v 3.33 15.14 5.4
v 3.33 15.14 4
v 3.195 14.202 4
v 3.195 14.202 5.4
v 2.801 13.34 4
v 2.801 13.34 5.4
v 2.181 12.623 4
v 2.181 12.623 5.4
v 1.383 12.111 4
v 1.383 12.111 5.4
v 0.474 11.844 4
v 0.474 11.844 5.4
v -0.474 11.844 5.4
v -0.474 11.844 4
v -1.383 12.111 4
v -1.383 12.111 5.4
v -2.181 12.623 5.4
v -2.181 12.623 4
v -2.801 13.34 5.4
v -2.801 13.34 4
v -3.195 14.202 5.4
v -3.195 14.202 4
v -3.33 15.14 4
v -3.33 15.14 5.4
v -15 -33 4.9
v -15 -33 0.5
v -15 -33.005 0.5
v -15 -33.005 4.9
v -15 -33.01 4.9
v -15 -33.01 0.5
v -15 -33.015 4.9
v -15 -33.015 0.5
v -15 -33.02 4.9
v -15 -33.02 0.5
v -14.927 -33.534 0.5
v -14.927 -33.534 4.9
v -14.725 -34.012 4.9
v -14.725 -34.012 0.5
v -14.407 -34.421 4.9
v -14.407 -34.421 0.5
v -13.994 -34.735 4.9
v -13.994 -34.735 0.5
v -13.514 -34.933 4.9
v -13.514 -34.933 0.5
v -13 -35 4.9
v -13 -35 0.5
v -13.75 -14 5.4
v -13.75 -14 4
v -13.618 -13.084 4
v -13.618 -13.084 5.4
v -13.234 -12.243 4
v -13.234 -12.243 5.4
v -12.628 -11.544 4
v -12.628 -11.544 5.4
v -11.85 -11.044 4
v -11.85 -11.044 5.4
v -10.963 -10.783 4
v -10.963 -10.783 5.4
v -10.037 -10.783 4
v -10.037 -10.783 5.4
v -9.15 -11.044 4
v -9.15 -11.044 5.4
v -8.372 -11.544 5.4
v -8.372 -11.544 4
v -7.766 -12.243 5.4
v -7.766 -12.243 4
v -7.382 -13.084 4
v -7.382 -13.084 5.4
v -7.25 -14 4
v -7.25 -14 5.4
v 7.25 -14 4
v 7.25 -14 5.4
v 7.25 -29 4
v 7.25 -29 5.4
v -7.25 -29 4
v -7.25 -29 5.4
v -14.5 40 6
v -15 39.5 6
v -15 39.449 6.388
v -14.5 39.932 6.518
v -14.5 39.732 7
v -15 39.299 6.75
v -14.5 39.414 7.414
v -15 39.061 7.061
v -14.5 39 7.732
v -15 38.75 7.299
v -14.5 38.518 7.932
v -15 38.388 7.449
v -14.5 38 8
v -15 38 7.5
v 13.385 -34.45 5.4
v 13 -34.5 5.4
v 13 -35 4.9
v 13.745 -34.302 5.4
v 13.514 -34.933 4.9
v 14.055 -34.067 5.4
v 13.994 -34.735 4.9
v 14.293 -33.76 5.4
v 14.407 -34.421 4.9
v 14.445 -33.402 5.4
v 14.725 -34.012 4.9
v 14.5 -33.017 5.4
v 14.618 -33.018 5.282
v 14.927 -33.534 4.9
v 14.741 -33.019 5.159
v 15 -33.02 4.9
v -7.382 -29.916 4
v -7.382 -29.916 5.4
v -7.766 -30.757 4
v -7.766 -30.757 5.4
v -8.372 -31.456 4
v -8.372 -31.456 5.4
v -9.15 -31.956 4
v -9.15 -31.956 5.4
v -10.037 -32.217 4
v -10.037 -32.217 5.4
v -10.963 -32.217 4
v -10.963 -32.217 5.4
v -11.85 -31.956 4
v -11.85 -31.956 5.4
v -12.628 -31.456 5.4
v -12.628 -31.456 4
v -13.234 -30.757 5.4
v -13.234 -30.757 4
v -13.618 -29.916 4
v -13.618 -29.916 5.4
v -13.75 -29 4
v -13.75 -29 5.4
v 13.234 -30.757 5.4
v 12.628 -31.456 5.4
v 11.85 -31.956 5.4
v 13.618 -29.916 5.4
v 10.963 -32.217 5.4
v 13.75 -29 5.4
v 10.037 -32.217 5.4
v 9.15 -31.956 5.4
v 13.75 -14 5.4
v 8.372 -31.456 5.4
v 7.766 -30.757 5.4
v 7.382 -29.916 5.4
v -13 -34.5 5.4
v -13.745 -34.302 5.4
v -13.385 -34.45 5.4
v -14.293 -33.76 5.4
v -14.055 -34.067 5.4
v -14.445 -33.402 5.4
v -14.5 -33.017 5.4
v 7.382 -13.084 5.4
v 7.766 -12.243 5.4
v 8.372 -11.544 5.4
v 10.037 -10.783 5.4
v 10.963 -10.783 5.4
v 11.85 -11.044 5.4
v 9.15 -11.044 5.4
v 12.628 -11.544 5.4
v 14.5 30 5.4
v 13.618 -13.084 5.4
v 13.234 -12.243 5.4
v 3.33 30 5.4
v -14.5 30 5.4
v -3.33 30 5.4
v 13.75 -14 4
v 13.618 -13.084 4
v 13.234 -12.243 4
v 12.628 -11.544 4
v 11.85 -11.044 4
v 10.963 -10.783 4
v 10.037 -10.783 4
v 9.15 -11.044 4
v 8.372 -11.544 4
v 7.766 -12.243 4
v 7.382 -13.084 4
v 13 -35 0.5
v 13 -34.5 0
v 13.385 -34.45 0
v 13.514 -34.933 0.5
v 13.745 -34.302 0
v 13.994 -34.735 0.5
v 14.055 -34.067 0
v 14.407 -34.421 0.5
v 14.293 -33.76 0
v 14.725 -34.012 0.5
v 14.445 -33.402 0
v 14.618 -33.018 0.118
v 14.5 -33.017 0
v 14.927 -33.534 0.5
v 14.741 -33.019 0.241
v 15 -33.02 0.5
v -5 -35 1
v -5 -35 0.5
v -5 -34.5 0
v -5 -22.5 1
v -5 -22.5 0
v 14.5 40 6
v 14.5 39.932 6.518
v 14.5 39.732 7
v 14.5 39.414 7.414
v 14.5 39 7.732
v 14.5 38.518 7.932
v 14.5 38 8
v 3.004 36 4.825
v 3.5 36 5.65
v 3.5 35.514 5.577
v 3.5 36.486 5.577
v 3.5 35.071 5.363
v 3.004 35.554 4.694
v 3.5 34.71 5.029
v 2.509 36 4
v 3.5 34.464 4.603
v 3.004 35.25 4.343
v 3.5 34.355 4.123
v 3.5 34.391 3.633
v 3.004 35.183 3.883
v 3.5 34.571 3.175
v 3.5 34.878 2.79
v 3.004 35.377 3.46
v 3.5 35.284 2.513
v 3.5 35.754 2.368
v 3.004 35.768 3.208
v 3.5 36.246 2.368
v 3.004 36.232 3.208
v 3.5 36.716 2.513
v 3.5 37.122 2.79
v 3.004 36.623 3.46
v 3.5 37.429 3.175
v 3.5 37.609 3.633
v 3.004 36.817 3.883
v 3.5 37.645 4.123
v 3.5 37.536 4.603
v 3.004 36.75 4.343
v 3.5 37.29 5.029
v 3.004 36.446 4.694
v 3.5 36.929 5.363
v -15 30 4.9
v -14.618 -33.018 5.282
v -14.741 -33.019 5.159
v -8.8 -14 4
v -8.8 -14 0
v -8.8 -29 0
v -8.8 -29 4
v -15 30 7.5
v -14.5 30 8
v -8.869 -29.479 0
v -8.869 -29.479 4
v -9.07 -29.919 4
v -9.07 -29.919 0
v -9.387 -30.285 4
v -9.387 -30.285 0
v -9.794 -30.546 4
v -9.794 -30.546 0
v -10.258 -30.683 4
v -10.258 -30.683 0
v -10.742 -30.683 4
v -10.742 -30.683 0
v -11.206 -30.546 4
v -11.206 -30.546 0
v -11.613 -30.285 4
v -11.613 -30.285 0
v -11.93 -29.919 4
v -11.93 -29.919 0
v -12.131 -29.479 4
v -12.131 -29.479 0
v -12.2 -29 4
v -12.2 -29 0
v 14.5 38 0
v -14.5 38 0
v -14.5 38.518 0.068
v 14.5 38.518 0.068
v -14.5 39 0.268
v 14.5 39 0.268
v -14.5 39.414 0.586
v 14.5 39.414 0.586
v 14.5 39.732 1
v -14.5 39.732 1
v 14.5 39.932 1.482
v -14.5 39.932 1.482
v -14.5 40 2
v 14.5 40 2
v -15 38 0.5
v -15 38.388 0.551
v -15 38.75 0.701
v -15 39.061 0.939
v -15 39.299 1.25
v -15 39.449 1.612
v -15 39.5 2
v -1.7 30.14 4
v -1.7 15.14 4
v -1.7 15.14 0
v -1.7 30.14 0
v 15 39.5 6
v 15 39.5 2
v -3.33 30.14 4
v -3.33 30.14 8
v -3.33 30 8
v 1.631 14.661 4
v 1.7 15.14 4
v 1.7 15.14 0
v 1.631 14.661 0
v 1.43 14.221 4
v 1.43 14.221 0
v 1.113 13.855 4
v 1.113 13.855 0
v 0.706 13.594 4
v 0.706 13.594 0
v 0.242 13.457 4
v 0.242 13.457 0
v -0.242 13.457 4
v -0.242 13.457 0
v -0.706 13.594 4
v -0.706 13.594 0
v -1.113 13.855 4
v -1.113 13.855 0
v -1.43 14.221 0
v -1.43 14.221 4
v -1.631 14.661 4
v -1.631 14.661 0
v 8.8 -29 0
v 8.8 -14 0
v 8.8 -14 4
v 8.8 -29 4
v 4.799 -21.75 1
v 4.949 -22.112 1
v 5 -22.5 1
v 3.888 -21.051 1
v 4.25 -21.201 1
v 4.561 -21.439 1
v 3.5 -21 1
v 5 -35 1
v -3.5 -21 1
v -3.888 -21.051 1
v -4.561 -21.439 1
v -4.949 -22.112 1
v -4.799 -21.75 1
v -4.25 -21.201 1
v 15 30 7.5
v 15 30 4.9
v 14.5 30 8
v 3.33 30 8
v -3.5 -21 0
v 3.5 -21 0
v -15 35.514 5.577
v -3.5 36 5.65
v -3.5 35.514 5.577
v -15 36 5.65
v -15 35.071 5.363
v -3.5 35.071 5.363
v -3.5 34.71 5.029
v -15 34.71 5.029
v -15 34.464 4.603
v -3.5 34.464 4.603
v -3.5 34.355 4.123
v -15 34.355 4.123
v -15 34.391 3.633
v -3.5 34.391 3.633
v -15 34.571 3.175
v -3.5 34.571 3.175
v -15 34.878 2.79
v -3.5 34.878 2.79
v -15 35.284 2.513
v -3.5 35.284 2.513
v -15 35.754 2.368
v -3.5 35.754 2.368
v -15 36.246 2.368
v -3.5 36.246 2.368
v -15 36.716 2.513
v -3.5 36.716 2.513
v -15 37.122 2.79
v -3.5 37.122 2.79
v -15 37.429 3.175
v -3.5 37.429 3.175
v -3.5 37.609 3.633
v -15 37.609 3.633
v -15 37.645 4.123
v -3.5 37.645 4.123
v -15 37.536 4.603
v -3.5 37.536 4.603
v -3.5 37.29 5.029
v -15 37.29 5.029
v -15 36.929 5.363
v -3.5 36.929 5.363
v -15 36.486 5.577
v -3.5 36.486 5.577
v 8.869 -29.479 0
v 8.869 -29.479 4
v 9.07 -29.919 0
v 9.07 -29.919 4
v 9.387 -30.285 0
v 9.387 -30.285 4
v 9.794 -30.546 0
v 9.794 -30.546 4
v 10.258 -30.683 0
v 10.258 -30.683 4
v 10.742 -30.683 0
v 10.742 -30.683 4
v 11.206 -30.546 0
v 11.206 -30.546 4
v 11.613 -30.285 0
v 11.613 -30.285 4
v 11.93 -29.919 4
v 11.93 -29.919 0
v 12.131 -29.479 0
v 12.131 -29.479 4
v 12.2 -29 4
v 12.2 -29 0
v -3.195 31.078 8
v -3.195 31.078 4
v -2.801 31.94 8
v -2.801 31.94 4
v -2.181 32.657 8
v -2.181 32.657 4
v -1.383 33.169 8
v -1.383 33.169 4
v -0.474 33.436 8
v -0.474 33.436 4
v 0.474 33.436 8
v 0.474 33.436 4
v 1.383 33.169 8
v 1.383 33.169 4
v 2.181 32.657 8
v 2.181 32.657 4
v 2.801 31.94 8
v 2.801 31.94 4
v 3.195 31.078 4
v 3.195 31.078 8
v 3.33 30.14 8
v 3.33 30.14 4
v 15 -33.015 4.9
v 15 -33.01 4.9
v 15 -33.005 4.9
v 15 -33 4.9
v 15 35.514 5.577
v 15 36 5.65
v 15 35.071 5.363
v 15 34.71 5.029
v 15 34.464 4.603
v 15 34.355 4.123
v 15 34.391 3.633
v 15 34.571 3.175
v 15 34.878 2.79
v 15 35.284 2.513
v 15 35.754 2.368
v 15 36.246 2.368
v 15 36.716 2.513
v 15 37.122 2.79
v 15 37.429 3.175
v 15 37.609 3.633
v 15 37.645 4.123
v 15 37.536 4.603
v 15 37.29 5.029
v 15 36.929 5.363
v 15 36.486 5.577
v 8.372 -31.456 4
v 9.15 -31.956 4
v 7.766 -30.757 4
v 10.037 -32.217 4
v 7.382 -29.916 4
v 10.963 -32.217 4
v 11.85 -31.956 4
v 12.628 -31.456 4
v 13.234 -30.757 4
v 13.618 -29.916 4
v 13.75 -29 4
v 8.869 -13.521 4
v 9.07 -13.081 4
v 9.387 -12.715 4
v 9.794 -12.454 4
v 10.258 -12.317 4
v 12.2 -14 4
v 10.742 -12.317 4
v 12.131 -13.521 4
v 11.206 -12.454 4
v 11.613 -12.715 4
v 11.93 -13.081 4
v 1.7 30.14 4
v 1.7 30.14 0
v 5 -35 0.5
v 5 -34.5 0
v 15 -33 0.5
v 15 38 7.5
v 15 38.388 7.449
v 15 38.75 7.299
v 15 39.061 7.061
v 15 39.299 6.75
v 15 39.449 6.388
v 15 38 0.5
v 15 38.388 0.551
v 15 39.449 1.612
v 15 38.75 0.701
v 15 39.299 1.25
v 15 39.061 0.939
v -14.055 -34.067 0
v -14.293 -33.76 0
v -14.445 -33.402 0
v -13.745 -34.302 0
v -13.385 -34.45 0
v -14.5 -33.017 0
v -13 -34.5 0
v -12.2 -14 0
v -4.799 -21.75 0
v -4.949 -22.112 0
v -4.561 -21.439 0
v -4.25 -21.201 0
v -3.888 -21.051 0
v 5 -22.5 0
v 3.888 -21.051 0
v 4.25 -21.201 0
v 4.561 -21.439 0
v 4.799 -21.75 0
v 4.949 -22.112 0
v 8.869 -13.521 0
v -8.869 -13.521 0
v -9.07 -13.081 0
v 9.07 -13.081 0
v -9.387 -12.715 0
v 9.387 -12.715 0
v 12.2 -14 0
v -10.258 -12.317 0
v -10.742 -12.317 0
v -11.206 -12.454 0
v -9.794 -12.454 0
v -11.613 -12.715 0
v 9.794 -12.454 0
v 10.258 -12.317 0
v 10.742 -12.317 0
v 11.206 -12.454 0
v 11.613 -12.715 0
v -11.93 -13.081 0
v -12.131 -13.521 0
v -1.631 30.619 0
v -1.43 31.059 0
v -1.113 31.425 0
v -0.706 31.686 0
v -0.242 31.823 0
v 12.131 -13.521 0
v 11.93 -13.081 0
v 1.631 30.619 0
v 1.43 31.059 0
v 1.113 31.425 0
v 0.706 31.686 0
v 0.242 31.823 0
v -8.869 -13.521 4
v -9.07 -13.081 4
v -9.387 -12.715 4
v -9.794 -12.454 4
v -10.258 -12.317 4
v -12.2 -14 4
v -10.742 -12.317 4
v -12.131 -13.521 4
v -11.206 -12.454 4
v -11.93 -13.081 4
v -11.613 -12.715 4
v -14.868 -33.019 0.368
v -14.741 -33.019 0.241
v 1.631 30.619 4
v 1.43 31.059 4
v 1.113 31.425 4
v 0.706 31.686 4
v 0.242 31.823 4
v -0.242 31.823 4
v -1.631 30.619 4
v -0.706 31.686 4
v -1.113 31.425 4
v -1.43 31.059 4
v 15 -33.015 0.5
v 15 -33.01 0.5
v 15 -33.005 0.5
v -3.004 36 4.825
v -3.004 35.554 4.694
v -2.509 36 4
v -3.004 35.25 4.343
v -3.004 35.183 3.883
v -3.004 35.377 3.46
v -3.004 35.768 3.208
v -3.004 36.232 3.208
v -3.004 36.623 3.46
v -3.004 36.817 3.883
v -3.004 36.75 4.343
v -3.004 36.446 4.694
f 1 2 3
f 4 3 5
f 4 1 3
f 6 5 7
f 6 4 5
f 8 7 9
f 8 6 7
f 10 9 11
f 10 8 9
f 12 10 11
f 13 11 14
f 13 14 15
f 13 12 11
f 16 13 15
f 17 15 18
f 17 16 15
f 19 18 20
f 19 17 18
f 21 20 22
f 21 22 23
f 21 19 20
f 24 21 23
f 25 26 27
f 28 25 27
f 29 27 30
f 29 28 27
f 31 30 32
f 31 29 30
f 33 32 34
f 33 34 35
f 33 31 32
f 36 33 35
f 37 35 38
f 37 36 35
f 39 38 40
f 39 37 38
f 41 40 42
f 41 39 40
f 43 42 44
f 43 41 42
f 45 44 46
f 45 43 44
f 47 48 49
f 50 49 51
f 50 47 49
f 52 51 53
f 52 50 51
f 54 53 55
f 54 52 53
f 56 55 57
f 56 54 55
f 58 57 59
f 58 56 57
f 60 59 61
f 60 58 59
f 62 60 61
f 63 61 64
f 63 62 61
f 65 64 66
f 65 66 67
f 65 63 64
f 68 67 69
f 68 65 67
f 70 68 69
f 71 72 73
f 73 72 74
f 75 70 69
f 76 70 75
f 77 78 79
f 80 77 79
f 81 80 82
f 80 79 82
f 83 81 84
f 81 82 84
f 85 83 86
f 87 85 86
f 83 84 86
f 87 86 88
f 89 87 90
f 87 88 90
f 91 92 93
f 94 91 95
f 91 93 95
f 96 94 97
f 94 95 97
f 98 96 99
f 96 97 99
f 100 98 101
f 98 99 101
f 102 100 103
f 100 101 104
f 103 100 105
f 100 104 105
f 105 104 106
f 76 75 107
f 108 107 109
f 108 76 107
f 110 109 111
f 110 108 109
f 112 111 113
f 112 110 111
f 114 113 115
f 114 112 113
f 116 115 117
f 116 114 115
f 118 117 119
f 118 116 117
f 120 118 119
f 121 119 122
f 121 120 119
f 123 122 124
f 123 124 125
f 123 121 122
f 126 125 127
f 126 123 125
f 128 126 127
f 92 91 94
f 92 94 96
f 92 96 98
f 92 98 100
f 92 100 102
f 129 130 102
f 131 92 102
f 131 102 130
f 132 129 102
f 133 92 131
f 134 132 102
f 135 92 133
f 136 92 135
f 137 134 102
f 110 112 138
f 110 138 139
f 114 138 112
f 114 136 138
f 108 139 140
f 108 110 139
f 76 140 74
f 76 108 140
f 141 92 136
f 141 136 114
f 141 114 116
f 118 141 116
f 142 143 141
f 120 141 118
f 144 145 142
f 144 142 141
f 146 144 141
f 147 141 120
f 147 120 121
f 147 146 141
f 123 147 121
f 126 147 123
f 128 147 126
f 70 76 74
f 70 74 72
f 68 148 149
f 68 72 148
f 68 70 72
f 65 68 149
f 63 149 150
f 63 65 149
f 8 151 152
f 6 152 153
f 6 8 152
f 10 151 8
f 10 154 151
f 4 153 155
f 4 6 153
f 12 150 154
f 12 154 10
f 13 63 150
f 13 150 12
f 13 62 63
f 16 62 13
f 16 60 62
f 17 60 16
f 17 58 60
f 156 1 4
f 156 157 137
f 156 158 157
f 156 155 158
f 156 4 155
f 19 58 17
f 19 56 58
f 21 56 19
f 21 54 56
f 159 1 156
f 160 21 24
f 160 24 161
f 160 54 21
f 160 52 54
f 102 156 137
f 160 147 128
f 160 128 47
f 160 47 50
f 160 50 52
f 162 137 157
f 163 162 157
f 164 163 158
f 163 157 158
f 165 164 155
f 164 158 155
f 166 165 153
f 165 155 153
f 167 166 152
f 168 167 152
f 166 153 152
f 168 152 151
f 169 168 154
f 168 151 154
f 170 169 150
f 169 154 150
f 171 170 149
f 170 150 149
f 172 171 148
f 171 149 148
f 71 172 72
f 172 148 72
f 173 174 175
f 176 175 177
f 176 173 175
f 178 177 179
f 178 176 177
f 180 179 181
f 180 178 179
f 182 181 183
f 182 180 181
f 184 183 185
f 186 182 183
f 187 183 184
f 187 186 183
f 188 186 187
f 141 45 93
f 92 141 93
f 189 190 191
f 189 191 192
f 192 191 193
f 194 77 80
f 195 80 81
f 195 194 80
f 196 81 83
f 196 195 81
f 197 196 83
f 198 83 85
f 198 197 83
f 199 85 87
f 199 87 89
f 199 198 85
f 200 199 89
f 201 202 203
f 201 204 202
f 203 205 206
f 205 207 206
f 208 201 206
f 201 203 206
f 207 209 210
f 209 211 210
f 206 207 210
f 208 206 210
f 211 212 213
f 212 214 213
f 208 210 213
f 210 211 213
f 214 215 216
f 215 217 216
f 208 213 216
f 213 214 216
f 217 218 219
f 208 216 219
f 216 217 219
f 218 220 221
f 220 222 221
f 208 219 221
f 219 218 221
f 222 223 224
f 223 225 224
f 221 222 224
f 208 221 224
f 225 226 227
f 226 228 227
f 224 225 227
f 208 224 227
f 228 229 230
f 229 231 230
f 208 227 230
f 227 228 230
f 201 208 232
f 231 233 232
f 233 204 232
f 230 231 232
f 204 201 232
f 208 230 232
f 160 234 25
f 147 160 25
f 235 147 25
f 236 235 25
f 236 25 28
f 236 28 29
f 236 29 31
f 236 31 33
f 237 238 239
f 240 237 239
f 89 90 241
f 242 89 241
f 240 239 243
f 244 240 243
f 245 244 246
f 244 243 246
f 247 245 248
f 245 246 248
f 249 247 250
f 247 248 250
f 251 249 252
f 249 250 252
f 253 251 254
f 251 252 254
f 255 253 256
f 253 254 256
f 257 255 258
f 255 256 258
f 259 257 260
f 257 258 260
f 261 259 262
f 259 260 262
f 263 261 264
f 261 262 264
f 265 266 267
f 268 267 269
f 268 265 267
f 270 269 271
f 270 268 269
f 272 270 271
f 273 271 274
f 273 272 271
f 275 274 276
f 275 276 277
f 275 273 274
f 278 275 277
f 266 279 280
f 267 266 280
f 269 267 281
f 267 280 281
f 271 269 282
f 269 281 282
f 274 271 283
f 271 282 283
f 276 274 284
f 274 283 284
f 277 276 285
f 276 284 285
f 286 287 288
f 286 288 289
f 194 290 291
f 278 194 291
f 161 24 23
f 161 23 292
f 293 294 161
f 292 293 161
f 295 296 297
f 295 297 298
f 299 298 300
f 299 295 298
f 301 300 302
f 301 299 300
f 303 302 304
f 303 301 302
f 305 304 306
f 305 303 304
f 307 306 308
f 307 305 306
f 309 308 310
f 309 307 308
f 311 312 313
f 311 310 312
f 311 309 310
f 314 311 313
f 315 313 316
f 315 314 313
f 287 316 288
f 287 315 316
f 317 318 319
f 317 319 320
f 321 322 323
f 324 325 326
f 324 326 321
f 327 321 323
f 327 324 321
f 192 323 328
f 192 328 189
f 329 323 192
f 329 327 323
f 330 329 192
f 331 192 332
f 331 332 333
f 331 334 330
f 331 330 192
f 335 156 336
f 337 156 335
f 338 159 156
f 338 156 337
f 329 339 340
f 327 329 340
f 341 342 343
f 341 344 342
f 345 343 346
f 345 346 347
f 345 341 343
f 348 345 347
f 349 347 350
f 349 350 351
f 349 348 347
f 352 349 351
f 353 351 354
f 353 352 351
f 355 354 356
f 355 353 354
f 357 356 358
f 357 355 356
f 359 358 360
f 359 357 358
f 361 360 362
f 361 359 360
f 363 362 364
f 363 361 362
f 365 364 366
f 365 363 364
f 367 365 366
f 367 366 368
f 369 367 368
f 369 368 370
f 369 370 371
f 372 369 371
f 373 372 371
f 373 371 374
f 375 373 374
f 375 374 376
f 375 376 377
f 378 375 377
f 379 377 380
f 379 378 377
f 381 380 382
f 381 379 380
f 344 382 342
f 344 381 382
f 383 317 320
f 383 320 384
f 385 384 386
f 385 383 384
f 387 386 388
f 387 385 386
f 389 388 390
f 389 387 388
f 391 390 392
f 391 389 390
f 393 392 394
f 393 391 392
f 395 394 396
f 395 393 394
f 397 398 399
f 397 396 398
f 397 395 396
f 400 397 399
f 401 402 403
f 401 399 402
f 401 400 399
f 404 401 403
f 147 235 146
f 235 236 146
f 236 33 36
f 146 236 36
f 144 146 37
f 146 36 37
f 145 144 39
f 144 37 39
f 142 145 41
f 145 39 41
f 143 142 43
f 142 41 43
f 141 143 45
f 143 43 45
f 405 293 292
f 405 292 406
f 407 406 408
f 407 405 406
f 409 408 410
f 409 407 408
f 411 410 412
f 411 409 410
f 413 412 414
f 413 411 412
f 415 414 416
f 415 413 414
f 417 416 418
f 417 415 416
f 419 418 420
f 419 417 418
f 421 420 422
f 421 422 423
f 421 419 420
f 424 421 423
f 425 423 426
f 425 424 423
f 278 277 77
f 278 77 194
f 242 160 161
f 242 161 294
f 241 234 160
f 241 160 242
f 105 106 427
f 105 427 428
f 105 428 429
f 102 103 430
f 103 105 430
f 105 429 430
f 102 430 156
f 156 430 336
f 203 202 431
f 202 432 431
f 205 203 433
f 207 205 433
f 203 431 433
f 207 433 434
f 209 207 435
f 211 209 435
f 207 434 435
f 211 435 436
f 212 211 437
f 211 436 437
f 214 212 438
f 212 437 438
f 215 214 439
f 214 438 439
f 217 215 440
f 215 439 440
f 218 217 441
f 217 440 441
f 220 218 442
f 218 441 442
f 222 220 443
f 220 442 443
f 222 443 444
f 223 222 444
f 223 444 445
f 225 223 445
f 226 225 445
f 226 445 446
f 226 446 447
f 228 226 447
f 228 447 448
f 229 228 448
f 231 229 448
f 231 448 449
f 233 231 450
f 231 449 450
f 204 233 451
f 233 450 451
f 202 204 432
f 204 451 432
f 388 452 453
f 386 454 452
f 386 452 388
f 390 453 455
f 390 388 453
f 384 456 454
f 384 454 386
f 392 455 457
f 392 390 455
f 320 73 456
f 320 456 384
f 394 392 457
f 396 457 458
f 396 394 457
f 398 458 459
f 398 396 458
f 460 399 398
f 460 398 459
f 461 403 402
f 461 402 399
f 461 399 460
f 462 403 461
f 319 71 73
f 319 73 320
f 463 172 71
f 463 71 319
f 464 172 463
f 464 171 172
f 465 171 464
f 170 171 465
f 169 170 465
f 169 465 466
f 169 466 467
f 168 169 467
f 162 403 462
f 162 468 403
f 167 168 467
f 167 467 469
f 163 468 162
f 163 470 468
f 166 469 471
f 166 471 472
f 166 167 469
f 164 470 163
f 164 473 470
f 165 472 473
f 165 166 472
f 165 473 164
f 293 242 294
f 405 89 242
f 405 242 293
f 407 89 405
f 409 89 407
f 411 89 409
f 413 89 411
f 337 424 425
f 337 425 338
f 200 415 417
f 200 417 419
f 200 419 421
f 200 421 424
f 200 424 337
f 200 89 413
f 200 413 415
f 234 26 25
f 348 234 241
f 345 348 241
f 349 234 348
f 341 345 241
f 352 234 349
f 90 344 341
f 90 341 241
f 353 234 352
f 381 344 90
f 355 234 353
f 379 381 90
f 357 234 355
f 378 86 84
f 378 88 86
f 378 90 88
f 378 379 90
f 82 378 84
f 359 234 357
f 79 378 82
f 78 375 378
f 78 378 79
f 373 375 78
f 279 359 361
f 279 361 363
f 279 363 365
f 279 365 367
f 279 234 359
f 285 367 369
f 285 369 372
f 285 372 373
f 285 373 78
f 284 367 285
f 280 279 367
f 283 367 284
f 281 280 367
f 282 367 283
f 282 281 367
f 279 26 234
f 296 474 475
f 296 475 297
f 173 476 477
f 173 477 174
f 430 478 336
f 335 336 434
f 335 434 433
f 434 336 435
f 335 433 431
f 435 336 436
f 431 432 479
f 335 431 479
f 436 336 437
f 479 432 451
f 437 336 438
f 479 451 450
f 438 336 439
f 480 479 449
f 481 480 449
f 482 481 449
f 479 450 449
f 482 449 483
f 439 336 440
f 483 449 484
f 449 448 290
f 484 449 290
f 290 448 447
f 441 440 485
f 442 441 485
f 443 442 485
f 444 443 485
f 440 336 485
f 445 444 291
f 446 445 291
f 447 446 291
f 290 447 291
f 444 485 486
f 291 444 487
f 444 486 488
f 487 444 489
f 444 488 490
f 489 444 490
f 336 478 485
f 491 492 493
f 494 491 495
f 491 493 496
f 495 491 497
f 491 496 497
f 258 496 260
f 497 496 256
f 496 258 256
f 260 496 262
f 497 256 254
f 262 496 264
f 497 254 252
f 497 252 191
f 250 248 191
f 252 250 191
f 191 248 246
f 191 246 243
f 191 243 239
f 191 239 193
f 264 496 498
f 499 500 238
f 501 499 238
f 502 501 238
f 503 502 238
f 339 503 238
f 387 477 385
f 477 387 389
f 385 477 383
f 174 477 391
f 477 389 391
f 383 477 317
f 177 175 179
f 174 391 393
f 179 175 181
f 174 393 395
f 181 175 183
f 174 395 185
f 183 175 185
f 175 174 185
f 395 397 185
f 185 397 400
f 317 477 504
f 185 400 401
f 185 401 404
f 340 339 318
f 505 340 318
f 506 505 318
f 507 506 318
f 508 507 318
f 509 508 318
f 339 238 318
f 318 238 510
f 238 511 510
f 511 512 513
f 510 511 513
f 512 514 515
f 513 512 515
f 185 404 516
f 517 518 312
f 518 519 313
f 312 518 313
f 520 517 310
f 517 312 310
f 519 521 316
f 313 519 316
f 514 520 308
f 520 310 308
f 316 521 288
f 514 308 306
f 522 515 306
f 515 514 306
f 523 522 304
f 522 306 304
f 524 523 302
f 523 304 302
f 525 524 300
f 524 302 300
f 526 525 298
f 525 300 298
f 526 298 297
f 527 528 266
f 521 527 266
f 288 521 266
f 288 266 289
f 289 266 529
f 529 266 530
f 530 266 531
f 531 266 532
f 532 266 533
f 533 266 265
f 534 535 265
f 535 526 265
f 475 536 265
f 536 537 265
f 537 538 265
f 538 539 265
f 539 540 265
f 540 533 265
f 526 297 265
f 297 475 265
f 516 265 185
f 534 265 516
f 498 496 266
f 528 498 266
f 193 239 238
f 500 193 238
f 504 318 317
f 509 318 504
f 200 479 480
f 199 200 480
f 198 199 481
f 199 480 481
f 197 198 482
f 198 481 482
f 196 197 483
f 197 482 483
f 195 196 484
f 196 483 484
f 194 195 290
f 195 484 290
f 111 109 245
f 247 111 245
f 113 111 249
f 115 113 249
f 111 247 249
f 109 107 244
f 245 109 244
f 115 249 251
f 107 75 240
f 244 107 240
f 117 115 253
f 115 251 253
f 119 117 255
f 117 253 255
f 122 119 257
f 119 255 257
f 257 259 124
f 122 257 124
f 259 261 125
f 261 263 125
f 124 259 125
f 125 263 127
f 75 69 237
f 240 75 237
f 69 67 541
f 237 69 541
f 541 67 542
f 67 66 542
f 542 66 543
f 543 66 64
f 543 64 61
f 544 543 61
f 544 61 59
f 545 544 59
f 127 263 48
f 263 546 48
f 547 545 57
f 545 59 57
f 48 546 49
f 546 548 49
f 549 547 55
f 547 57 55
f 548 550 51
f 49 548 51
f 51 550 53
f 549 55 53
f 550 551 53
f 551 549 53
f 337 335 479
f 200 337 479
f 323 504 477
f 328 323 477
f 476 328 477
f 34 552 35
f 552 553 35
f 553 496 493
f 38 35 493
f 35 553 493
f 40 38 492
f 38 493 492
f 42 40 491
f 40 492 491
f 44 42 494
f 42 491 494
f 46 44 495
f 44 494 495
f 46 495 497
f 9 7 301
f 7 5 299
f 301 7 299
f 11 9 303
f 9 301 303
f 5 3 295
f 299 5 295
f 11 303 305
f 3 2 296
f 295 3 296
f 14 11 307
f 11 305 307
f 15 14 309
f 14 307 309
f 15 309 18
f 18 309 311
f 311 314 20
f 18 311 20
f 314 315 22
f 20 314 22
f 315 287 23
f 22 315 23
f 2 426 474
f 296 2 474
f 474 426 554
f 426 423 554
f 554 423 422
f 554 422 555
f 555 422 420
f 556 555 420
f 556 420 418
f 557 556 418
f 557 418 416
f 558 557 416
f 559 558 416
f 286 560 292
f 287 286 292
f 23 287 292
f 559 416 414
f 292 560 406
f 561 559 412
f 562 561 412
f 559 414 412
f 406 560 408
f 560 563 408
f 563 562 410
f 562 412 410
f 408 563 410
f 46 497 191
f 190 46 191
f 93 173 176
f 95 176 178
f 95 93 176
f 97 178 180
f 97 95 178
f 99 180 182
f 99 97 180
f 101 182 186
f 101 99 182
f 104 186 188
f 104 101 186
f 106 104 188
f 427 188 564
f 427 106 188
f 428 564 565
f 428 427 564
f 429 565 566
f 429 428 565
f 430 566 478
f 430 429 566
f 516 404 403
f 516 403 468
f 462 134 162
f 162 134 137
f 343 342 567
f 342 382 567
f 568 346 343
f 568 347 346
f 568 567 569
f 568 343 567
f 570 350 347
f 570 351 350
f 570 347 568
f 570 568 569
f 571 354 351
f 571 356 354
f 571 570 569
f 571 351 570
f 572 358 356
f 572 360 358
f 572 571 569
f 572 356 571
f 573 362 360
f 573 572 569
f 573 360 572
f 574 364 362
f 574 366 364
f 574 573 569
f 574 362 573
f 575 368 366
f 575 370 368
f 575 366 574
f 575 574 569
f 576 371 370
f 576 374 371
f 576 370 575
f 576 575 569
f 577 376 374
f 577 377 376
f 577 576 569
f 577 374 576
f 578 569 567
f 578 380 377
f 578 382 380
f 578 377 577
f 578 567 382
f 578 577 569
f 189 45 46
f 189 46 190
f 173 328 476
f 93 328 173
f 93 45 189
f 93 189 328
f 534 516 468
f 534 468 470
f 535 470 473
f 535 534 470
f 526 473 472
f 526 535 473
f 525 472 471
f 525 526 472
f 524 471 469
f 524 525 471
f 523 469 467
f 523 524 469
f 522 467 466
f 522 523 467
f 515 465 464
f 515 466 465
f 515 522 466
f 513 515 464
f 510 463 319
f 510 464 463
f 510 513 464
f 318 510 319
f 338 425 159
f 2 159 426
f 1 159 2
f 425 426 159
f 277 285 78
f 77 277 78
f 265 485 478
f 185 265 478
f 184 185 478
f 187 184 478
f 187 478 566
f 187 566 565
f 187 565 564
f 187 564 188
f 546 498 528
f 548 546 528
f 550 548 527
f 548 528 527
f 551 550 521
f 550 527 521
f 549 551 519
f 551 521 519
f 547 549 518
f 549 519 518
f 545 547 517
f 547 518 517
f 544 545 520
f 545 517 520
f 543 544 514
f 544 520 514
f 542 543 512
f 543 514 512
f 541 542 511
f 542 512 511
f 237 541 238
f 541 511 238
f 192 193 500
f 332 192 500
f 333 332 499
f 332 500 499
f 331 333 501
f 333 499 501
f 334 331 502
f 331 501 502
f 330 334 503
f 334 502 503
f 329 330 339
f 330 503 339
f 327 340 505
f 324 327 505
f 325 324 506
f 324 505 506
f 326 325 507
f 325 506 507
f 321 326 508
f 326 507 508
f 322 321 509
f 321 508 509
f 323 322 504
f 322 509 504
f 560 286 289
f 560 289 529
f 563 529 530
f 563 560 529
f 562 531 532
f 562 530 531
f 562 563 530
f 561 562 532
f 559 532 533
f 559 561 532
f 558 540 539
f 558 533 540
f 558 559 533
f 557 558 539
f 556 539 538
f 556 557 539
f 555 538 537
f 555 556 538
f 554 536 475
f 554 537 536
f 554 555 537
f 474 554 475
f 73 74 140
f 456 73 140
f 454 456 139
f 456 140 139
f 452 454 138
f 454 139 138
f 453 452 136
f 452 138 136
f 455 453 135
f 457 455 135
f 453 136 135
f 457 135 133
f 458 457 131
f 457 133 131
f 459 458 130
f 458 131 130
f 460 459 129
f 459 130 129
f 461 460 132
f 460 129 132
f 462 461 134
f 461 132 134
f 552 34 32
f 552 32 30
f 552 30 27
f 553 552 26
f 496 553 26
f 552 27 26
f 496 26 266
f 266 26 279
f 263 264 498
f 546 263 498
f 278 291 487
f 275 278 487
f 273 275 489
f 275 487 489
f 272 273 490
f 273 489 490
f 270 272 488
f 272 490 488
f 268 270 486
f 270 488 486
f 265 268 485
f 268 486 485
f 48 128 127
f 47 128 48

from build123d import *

# Parameters (mm, degrees)
SKETCH1_W           = 30
SKETCH1_H           = 80
BOSS_EXTRUDE1_DEPTH = 8
CUT_EXTRUDE1_DEPTH  = 44.462627624
CUT_EXTRUDE2_DEPTH  = 4
CUT_EXTRUDE3_DEPTH  = 32
CUT_EXTRUDE4_DEPTH  = 4
SKETCH8_W           = 2.6
SKETCH8_H           = 70
CUT_EXTRUDE5_DEPTH  = 73
FILLET1_R           = 2
FILLET2_R           = 2
CHAMFER1_SIZE       = 0.5
CUT_EXTRUDE7_DEPTH  = 1
SKETCH10_W          = 41.633807812
SKETCH10_H          = 5
CUT_EXTRUDE8_DEPTH  = 10
FILLET3_R           = 2
CHAMFER2_SIZE       = 0.5


with BuildPart() as part:
    # Sketch1 → Boss-Extrude1 (new body)
    with BuildSketch(Plane.XY):
        Rectangle(SKETCH1_W, SKETCH1_H)
    extrude(amount=BOSS_EXTRUDE1_DEPTH)

    # Sketch3 → M4 Tapped Hole1 (revolve, cut)
    with BuildSketch(Plane(origin=(-15, 36, 4), x_dir=(0, 0, 1), z_dir=(0, 1, 0))):
        Polygon((0, 0), (0, 12.491420021), (1.65, 11.5), (1.65, 0), align=None)
    m4_tapped_hole1 = revolve(axis=Axis((-21.35, 36, 4), (1, 0, 0)), mode=Mode.SUBTRACT)

    # Mirror1: M4 Tapped Hole1 across plane
    add(m4_tapped_hole1.mirror(Plane.ZY), mode=Mode.SUBTRACT)

    # Sketch4 → Cut-Extrude1 (cut, through all)
    with BuildSketch(Plane(origin=(0, 0, 0), x_dir=(-1, 0, 0), z_dir=(0, 0, -1))):
        with BuildLine():
            Line((-8.8, -14), (-8.8, -29))
            ThreePointArc((-8.8, -29), (-10.5, -30.7), (-12.2, -29))
            Line((-12.2, -29), (-12.2, -14))
            ThreePointArc((-12.2, -14), (-10.5, -12.3), (-8.8, -14))
        make_face()
        with BuildLine():
            Line((8.8, -14), (8.8, -29))
            ThreePointArc((8.8, -29), (10.5, -30.7), (12.2, -29))
            Line((12.2, -29), (12.2, -14))
            ThreePointArc((12.2, -14), (10.5, -12.3), (8.8, -14))
        make_face()
    extrude(amount=-CUT_EXTRUDE1_DEPTH, mode=Mode.SUBTRACT)

    # Sketch5 → Cut-Extrude2 (cut)
    with BuildSketch(Plane.XY.offset(8)):
        with BuildLine():
            Line((-7.25, -14), (-7.25, -29))
            ThreePointArc((-7.25, -29), (-10.5, -32.25), (-13.75, -29))
            Line((-13.75, -29), (-13.75, -14))
            ThreePointArc((-13.75, -14), (-10.5, -10.75), (-7.25, -14))
        make_face()
        with BuildLine():
            Line((7.25, -14), (7.25, -29))
            ThreePointArc((7.25, -29), (10.5, -32.25), (13.75, -29))
            Line((13.75, -29), (13.75, -14))
            ThreePointArc((13.75, -14), (10.5, -10.75), (7.25, -14))
        make_face()
    extrude(amount=-CUT_EXTRUDE2_DEPTH, mode=Mode.SUBTRACT)

    # Sketch6 → Cut-Extrude3 (cut)
    with BuildSketch(Plane.XY.offset(8)):
        with BuildLine():
            Line((1.7, 30.14), (1.7, 15.14))
            ThreePointArc((1.7, 15.14), (0, 13.44), (-1.7, 15.14))
            Line((-1.7, 15.14), (-1.7, 30.14))
            ThreePointArc((-1.7, 30.14), (0, 31.84), (1.7, 30.14))
        make_face()
    extrude(amount=-CUT_EXTRUDE3_DEPTH, mode=Mode.SUBTRACT)

    # Sketch7 → Cut-Extrude4 (cut)
    with BuildSketch(Plane.XY.offset(8)):
        with BuildLine():
            Line((3.329829484, 30.14), (3.329829484, 15.14))
            ThreePointArc((3.329829484, 15.14), (0, 11.810170516), (-3.329829484, 15.14))
            Line((-3.329829484, 15.14), (-3.329829484, 30.14))
            ThreePointArc((-3.329829484, 30.14), (0, 33.469829484), (3.329829484, 30.14))
        make_face()
    extrude(amount=-CUT_EXTRUDE4_DEPTH, mode=Mode.SUBTRACT)

    # Sketch8 → Cut-Extrude5 (cut)
    with BuildSketch(Plane.ZY.offset(15)):
        with Locations((6.7, -5)):
            Rectangle(SKETCH8_W, SKETCH8_H)
    extrude(amount=-CUT_EXTRUDE5_DEPTH, mode=Mode.SUBTRACT)

    # Fillet1
    fillet1_edges = [part.edges().sort_by_distance(p)[0] for p in [
        (0, 40, 0),
        (0, 40, 8),
    ]]
    fillet(fillet1_edges, radius=FILLET1_R)

    # Fillet2
    fillet2_edges = [part.edges().sort_by_distance(p)[0] for p in [
        (15, -40, 2.7),
        (-15, -40, 2.7),
    ]]
    fillet(fillet2_edges, radius=FILLET2_R)

    # Chamfer1
    chamfer1_edges = [part.edges().sort_by_distance(p)[0] for p in [
        (15, 34, 8),
        (15, -4, 5.4),
        (-15, -4, 5.4),
        (-15, 34, 8),
        (-15, 40, 4),
        (-15, 0, 0),
        (-15, 39.414213562, 0.585786438),
        (-15, 39.414213562, 7.414213562),
        (15, 40, 4),
        (15, 39.414213562, 0.585786438),
        (15, 39.414213562, 7.414213562),
        (0, -40, 5.4),
        (0, -40, 0),
        (15, 0, 0),
        (14.414213562, -39.414213562, 0),
        (-14.414213562, -39.414213562, 0),
        (14.414213562, -39.414213562, 5.4),
        (-14.414213562, -39.414213562, 5.4),
    ]]
    chamfer(chamfer1_edges, length=CHAMFER1_SIZE)

    # Sketch9 → Cut-Extrude7 (cut)
    with BuildSketch(Plane(origin=(0, 0, 0), x_dir=(-1, 0, 0), z_dir=(0, 0, -1))):
        with BuildLine():
            Line((-5, -40), (5, -40))
            Line((5, -40), (5, -22.5))
            ThreePointArc((5, -22.5), (4.560660172, -21.439339828), (3.5, -21))
            Line((3.5, -21), (-3.5, -21))
            ThreePointArc((-3.5, -21), (-4.560660172, -21.439339828), (-5, -22.5))
            Line((-5, -22.5), (-5, -40))
        make_face()
    extrude(amount=-CUT_EXTRUDE7_DEPTH, mode=Mode.SUBTRACT)

    # Sketch10 → Cut-Extrude8 (cut)
    with BuildSketch(Plane.XY.offset(5.4)):
        with Locations((0.581549675, -37.5)):
            Rectangle(SKETCH10_W, SKETCH10_H)
    extrude(amount=-CUT_EXTRUDE8_DEPTH, mode=Mode.SUBTRACT)

    # Fillet3
    fillet3_edges = [part.edges().sort_by_distance(p)[0] for p in [
        (15, -35, 2.7),
        (-15, -35, 2.7),
    ]]
    fillet(fillet3_edges, radius=FILLET3_R)

    # Chamfer2
    chamfer2_edges = [part.edges().sort_by_distance(p)[0] for p in [
        (13.822875656, -34.822875656, 0),
        (9, -35, 0),
        (13.822875656, -34.822875656, 5.4),
        (-13.822875656, -34.822875656, 5.4),
        (0, -35, 5.4),
        (-13.822875656, -34.822875656, 0),
        (-9, -35, 0),
    ]]
    chamfer(chamfer2_edges, length=CHAMFER2_SIZE - 0.0001)  # a hair under: the kernel refuses the full size


solid = part.part
